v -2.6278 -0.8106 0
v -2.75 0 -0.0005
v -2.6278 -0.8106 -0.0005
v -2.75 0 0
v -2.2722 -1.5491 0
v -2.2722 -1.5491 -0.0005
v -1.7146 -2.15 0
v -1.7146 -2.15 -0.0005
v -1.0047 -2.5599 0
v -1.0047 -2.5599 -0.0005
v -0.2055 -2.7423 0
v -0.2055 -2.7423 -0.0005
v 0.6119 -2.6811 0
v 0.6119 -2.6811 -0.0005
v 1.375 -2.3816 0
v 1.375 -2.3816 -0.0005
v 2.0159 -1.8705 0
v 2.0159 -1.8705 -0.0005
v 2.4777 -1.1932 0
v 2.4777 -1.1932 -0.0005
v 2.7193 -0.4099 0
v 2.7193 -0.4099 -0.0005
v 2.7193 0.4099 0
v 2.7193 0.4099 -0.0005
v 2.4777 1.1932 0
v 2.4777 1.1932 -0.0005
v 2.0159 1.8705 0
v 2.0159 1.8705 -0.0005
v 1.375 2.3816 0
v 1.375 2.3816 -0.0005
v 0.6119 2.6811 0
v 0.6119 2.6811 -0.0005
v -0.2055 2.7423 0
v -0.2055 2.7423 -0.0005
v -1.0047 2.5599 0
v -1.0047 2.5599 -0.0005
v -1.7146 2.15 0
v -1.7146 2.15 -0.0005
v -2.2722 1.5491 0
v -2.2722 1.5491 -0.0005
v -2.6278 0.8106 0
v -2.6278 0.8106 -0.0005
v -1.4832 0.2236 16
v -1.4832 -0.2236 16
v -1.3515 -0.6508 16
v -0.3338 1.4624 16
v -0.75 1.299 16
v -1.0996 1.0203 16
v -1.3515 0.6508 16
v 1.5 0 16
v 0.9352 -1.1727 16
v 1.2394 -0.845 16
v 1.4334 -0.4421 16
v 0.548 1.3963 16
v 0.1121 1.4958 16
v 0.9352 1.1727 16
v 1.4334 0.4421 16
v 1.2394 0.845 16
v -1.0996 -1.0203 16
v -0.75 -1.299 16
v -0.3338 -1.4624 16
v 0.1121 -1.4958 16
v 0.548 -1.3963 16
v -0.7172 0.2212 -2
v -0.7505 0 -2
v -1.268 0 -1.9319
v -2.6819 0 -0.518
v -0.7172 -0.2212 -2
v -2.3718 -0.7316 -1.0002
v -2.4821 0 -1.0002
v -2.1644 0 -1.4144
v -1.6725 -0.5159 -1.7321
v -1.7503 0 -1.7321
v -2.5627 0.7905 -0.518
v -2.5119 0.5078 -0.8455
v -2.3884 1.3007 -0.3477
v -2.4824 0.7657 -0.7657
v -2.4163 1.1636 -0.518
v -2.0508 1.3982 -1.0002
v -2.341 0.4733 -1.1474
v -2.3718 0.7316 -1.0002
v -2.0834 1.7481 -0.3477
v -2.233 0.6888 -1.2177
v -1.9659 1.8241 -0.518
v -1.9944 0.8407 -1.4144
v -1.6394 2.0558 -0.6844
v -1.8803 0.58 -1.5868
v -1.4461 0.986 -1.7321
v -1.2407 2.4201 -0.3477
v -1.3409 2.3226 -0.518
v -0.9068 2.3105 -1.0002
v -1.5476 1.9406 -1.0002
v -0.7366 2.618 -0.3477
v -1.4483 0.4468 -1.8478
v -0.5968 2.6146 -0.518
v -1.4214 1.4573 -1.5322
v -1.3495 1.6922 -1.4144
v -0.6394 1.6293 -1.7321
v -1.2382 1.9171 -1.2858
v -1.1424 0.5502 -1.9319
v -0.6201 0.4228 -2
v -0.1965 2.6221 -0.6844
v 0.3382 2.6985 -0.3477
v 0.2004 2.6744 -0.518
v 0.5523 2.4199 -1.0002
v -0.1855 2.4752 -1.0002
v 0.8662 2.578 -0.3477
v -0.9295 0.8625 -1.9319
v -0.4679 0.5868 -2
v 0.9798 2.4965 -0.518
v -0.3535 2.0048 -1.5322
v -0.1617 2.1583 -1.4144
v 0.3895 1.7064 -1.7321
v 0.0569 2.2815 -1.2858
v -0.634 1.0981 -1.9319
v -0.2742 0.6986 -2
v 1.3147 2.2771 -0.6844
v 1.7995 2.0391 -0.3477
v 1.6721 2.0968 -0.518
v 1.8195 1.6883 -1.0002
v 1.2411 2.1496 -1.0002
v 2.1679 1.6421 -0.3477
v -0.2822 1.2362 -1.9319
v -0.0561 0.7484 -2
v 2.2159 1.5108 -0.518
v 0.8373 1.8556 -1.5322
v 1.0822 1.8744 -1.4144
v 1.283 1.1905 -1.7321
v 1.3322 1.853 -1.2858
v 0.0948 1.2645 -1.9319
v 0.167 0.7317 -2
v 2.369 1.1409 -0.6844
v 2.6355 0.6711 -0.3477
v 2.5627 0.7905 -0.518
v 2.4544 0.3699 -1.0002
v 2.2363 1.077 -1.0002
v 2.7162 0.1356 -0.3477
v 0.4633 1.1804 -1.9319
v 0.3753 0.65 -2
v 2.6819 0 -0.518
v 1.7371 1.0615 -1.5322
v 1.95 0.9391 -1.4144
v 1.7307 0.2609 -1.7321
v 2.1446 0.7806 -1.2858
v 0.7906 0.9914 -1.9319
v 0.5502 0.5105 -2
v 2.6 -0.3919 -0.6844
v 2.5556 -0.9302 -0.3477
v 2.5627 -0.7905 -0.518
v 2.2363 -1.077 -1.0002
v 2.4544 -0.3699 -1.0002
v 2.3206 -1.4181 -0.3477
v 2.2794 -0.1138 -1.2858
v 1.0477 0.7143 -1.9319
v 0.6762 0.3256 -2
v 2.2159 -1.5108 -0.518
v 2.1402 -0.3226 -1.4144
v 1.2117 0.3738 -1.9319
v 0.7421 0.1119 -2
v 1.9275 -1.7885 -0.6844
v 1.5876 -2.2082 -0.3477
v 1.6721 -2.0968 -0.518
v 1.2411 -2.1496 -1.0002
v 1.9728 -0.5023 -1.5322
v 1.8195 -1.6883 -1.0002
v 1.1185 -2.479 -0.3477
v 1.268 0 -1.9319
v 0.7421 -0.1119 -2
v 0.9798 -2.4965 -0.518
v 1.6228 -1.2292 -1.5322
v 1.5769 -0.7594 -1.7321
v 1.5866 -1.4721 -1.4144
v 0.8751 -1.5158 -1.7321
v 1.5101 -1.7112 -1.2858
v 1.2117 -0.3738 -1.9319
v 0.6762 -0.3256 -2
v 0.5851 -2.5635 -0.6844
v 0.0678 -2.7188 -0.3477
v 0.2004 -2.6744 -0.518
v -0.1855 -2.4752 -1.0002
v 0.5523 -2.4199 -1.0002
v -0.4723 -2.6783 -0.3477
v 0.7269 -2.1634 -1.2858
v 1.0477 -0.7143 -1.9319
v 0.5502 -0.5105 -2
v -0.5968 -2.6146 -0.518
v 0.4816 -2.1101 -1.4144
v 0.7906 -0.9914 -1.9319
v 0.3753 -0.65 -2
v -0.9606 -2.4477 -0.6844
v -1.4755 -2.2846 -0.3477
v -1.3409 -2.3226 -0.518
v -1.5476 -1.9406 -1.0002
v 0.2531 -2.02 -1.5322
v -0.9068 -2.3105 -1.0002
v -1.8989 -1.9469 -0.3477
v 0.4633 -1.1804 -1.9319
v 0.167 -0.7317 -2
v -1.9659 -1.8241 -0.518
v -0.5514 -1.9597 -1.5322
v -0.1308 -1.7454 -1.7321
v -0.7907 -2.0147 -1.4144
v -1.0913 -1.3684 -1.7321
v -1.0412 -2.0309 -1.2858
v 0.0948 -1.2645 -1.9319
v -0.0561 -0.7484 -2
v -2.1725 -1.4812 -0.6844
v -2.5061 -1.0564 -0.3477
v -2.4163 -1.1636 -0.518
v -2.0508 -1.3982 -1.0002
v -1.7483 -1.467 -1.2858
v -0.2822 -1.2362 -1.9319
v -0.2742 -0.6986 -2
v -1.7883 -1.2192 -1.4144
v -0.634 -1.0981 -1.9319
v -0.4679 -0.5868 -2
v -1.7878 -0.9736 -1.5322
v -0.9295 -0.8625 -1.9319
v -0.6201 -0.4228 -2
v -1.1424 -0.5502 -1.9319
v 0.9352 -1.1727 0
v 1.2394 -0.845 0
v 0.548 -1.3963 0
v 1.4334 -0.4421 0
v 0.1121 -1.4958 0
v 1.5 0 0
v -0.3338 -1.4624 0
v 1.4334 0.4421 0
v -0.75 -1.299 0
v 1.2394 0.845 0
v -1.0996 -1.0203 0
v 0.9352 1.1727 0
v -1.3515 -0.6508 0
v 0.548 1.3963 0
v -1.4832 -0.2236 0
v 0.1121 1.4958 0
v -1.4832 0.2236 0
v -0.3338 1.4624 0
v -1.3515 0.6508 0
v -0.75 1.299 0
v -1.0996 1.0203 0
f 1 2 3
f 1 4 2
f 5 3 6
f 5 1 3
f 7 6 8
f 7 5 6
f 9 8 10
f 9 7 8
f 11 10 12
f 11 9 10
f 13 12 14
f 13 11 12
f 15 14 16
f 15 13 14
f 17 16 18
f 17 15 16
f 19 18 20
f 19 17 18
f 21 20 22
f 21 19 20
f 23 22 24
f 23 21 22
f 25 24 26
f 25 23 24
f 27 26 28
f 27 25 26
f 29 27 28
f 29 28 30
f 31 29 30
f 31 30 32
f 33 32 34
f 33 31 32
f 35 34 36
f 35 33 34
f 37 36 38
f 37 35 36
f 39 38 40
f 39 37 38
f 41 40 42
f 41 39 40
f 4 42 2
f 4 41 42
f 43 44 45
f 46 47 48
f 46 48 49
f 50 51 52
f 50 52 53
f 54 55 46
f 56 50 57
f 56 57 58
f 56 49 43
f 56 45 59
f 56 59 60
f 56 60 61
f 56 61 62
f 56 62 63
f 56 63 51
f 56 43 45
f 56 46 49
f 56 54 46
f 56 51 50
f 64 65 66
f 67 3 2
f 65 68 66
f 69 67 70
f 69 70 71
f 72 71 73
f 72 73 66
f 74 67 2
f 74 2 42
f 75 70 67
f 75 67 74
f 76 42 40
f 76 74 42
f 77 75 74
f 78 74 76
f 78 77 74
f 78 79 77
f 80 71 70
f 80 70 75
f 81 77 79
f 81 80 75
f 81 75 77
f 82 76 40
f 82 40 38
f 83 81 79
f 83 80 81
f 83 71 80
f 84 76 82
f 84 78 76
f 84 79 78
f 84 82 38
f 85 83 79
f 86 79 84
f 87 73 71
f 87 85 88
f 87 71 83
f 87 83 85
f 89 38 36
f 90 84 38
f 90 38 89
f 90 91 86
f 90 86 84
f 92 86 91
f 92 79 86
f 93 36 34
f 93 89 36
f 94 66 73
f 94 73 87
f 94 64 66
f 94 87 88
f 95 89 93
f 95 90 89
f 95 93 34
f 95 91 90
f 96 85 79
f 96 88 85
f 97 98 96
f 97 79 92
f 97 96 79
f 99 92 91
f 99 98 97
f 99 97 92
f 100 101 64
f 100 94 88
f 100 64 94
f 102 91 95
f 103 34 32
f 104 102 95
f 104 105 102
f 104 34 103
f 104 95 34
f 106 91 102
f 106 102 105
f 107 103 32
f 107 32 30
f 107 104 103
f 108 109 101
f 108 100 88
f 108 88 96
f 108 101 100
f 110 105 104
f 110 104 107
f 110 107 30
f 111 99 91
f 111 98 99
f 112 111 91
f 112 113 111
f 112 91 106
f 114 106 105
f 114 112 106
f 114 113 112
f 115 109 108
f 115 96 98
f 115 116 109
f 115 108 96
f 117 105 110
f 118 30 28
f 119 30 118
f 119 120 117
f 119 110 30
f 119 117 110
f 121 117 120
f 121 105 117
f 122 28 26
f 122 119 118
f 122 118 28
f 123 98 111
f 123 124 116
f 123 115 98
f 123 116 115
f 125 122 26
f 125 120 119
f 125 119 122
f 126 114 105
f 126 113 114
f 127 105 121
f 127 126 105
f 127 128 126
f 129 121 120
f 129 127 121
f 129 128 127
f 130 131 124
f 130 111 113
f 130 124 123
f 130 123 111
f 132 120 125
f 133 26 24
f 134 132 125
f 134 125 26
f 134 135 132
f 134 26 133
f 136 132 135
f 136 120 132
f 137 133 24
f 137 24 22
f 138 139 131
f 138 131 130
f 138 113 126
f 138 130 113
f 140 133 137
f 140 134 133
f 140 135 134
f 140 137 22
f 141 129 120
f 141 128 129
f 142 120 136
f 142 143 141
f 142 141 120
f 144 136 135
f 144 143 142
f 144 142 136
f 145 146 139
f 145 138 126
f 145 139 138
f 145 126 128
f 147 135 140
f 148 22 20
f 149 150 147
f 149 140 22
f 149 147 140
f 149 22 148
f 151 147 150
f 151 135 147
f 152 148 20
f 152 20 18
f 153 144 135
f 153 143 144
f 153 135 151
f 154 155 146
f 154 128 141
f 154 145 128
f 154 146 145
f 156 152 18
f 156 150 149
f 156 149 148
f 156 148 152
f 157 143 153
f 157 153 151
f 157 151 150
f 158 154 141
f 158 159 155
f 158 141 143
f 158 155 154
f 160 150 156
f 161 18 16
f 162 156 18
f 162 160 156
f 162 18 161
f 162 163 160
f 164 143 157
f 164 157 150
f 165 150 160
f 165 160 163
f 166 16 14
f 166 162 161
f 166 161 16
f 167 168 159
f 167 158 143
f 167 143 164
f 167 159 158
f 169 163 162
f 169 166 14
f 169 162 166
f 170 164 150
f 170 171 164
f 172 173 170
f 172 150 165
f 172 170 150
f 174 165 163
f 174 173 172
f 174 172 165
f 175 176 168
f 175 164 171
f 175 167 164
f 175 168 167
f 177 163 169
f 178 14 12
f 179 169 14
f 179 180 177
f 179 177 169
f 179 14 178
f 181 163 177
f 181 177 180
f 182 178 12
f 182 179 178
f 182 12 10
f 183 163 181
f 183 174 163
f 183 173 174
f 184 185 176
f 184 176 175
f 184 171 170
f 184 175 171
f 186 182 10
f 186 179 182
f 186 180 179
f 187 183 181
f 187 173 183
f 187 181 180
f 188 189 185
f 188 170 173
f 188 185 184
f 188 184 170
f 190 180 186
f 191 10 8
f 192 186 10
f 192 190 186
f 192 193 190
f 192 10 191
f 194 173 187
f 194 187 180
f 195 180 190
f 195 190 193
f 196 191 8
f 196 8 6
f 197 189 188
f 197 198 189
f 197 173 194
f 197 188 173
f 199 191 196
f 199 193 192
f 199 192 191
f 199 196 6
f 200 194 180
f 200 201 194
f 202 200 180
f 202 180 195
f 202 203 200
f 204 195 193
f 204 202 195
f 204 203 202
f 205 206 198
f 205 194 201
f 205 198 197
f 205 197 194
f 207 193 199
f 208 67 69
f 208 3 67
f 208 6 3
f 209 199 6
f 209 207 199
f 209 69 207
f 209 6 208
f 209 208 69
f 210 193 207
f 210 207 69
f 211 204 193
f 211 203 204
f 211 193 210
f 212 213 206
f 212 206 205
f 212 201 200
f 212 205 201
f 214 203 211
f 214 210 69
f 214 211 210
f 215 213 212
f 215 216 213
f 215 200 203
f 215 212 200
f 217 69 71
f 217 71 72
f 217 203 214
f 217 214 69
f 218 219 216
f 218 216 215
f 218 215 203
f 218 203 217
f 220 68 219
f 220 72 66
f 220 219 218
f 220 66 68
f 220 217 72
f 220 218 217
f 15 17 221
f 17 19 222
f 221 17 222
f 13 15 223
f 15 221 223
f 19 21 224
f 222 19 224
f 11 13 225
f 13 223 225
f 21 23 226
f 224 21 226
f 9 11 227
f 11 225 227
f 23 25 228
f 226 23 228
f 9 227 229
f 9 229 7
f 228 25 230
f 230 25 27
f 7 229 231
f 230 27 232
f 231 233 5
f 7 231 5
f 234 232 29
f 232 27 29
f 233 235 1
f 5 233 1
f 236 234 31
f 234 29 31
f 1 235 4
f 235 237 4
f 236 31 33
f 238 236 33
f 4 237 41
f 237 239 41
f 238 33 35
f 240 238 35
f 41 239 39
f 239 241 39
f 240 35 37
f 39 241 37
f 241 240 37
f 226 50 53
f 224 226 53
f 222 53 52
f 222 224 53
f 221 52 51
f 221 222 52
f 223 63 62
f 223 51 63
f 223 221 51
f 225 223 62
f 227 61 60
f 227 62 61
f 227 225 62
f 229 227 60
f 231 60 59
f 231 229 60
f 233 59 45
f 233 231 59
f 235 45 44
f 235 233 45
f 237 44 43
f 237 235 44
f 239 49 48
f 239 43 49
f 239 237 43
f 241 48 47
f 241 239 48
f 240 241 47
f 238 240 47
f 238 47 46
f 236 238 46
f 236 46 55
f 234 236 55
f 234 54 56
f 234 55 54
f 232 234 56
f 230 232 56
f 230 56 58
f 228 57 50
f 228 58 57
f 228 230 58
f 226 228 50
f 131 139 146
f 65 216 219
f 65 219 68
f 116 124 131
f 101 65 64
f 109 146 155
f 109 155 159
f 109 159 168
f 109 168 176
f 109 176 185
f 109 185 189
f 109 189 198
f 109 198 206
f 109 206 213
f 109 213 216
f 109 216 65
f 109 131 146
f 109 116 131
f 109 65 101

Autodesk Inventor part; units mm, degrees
ref_plane "YZ Plane" through (0, 0, 0) normal (1, 0, 0) x (0, 1, 0)
ref_plane "XZ Plane" through (0, 0, 0) normal (0, 1, 0) x (-1, 0, 0)
ref_plane "XY Plane" through (0, 0, 0) normal (0, 0, 1) x (1, 0, 0)
sketch "スケッチ1" plane through (0, 0, 0) normal (0, 0, 1) x (1, 0, 0)
  circle A0 centre (0, 0) radius 1.5
  dimension "d0" = 3
extrude "押し出し1" add sketch "スケッチ1" along normal blind 16
sketch "スケッチ2" plane through (0, 0, 0) normal (0, 0, -1) x (-1, 0, 0)
  circle A0 centre (0, 0) radius 2.75
  dimension "d3" = 5.5
extrude "押し出し2" add sketch "スケッチ2" along normal blind 2
fillet "フィレット1" radius 2 1 edges at (2.75, 0, -2)
thread "ねじ1" size "M3x0.5" class "6g" standard "ANSI Metric M Profile" full length
properties part number "ネジ鍋m3,16" material "鋼、高強度、低合金"
